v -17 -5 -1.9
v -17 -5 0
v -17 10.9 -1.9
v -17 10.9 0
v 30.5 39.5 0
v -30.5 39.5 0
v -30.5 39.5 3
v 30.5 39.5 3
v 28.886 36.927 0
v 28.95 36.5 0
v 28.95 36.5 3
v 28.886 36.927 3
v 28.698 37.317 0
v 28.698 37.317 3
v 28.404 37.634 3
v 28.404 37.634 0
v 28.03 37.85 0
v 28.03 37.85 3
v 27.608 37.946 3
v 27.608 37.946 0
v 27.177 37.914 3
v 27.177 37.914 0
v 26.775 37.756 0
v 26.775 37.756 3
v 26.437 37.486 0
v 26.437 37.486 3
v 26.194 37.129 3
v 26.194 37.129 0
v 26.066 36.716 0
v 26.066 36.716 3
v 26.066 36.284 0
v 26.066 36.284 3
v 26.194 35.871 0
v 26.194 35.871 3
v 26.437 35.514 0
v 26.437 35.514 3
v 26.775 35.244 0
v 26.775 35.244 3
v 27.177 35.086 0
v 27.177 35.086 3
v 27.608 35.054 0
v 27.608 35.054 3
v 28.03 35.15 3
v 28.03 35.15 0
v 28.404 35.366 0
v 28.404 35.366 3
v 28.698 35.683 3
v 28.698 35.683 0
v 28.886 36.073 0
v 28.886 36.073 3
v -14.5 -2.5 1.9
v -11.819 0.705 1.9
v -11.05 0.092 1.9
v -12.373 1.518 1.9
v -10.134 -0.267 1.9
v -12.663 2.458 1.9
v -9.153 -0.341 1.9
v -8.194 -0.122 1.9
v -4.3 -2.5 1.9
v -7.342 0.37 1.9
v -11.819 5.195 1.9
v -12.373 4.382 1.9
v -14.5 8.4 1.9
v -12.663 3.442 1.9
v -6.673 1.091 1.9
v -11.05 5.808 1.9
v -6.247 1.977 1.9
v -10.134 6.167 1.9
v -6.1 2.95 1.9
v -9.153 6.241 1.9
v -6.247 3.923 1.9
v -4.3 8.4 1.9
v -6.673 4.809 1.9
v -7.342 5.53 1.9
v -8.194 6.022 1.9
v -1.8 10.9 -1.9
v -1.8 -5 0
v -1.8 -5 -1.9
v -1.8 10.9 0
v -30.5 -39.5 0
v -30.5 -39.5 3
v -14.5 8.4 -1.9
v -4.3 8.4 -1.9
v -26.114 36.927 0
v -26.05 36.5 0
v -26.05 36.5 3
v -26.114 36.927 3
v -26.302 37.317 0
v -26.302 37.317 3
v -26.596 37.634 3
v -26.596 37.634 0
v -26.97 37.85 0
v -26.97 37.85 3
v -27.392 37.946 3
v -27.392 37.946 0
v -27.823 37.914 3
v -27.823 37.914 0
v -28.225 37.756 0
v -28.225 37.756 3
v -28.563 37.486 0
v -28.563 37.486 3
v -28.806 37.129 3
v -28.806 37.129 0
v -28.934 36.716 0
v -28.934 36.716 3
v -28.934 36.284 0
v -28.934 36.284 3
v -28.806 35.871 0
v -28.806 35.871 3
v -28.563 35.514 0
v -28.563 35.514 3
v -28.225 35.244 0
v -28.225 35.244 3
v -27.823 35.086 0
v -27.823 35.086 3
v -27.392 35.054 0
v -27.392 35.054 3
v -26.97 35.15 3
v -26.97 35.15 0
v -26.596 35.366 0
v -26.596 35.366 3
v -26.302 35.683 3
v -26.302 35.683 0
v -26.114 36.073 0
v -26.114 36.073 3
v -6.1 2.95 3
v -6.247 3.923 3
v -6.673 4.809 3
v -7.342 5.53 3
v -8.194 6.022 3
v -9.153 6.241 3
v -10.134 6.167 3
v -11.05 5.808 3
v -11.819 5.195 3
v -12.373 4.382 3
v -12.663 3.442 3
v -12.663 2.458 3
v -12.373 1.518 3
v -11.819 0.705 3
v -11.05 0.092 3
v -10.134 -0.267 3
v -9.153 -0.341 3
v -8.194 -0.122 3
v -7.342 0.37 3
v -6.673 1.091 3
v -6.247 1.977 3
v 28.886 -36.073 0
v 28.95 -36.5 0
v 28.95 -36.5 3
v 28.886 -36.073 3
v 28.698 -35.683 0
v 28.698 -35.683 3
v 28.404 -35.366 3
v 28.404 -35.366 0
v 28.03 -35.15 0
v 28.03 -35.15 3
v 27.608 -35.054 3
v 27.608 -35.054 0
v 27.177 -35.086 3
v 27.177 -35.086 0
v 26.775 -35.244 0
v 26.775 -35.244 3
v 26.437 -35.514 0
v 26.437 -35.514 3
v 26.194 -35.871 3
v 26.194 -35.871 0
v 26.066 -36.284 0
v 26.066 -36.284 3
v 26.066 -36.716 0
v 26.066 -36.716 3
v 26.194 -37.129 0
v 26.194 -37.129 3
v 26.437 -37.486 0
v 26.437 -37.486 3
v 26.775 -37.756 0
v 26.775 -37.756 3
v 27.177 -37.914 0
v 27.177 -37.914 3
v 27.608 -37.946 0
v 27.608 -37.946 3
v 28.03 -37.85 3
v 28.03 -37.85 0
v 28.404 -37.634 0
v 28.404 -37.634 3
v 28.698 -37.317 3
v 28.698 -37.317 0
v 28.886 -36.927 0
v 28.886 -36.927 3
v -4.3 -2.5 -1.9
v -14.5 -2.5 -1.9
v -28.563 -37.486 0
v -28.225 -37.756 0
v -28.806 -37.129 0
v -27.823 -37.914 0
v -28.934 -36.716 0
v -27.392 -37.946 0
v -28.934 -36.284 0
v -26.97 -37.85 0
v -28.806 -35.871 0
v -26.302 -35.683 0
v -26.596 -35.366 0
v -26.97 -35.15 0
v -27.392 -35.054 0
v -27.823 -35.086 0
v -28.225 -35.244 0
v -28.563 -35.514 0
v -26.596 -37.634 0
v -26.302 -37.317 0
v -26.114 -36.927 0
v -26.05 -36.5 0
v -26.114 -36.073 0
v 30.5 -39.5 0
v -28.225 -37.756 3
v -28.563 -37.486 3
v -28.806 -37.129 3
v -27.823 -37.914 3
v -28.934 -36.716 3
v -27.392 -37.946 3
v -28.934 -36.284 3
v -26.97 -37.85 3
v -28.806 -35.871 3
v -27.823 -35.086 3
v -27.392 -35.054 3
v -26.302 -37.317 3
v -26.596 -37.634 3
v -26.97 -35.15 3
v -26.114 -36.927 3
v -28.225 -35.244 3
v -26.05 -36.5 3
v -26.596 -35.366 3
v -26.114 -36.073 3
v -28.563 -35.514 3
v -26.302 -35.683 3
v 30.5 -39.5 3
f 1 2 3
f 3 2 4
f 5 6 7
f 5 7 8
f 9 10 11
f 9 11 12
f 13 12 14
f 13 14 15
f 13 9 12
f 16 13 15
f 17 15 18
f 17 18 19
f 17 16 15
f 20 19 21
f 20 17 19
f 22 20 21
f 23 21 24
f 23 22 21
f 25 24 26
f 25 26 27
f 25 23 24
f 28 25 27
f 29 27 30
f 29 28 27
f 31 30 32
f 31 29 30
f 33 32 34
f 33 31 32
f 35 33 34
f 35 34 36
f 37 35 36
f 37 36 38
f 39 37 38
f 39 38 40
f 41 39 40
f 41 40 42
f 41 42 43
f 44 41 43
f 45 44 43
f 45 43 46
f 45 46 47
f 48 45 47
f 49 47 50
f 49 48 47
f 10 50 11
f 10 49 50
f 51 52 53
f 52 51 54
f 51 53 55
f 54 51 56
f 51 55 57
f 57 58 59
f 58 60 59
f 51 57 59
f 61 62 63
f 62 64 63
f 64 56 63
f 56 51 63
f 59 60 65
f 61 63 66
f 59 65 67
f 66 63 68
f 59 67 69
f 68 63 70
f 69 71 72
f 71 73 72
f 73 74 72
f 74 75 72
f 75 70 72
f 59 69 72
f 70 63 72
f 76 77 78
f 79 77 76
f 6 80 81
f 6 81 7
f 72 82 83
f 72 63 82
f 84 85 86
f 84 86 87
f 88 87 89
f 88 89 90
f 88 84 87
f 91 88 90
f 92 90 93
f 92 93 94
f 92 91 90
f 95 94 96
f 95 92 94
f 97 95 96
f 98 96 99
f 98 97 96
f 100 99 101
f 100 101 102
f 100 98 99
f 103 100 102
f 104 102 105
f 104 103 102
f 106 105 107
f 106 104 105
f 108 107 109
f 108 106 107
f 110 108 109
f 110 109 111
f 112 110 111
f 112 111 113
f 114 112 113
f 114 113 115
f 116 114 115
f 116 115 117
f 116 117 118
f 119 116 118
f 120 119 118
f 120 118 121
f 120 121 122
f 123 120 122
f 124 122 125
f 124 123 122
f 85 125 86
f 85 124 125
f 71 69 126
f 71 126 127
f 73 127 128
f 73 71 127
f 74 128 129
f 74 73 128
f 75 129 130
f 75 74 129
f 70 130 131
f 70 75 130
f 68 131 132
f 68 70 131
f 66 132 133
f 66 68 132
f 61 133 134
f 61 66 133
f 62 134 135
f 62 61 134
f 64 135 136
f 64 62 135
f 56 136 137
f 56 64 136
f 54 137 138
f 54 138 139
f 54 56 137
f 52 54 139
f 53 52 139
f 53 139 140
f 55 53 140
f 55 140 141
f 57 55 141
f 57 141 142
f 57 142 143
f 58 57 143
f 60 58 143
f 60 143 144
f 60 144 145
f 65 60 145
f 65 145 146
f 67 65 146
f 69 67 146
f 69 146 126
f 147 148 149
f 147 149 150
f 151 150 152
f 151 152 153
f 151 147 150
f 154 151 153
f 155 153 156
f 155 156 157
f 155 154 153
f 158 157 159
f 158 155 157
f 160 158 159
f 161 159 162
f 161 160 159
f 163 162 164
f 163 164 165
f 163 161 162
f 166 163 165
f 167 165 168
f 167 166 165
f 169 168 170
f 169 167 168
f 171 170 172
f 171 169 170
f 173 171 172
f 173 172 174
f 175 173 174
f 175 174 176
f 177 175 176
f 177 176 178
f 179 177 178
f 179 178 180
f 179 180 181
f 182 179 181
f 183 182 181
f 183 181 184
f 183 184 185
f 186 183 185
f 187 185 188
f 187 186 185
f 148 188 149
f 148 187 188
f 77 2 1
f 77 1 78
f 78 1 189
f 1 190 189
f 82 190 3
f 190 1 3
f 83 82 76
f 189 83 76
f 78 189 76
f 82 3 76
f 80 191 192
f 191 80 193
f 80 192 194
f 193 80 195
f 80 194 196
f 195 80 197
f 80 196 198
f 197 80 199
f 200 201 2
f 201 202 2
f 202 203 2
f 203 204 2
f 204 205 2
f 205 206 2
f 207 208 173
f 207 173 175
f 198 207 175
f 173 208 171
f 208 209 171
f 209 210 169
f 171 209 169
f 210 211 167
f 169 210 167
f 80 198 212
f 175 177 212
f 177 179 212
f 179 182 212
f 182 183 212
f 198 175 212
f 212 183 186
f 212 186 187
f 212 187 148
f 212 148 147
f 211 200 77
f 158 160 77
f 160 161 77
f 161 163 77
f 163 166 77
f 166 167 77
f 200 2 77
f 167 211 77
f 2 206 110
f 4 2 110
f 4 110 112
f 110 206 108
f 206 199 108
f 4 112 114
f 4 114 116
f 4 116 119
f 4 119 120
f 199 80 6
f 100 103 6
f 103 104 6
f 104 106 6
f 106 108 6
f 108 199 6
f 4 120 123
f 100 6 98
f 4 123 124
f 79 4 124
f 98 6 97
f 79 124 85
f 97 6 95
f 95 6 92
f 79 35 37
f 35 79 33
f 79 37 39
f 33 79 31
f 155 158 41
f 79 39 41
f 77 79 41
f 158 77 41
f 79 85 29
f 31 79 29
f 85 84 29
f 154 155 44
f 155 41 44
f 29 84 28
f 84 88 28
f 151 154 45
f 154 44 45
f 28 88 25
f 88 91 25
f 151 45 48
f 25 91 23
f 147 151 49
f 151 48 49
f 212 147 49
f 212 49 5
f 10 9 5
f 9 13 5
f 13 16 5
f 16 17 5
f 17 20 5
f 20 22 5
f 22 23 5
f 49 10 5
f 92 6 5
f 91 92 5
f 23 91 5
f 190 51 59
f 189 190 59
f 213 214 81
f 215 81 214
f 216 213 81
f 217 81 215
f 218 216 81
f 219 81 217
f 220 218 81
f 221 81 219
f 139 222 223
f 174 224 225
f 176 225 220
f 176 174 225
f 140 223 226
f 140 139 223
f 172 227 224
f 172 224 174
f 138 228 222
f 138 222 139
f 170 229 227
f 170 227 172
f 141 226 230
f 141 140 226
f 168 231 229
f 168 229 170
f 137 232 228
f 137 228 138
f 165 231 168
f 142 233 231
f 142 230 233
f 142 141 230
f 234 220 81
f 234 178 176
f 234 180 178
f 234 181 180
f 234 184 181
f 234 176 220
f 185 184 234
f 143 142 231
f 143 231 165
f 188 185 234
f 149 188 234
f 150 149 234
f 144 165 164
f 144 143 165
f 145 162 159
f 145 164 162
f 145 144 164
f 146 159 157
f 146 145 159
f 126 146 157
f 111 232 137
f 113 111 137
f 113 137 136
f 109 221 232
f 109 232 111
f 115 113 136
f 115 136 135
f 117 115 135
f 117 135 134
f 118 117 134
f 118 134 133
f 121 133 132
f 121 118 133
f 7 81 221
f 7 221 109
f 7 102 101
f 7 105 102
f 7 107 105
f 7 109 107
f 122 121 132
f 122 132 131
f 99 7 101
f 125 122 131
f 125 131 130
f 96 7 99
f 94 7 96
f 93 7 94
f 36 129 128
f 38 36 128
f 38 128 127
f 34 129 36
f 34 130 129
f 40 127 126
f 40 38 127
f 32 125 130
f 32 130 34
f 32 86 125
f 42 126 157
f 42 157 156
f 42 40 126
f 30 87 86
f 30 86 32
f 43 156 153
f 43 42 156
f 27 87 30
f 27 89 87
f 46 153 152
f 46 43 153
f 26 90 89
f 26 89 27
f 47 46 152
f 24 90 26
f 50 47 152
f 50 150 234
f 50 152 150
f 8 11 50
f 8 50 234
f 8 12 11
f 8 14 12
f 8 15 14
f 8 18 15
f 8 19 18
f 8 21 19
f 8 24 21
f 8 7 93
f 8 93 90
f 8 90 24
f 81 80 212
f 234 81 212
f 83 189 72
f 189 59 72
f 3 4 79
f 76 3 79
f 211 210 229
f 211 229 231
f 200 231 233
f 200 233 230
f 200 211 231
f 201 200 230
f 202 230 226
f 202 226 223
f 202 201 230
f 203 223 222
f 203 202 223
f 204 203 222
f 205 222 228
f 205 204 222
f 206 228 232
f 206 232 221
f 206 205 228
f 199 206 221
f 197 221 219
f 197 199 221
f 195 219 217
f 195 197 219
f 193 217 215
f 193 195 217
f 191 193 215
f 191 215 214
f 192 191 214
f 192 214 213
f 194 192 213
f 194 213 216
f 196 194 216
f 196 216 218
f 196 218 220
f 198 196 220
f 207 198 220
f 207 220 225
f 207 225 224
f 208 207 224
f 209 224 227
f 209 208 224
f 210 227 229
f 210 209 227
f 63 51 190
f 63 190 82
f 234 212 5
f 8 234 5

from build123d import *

# Parameters (mm, degrees)
F0_W     = 61
F0_H     = 79
F0_R     = 1.45
F0_W_2   = 15.200002
F0_H_2   = 15.900002
F0_W_3   = 10.2
F0_H_3   = 10.9
F0_R_2   = 3.3
F1_DEPTH = 3
F2_DEPTH = 1.9
F3_DEPTH = 1.9


with BuildPart() as f1:
    # F0 (on Top) → F1 (new body)
    with BuildSketch(Plane.XY):
        Rectangle(F0_W, F0_H)
        with Locations((-27.5, -36.5)):
            Circle(F0_R, mode=Mode.SUBTRACT)
        with Locations((27.5, -36.5)):
            Circle(F0_R, mode=Mode.SUBTRACT)
        with Locations((-9.4, 2.95)):
            Rectangle(F0_W_2, F0_H_2, mode=Mode.SUBTRACT)
        with Locations((-27.5, 36.5)):
            Circle(F0_R, mode=Mode.SUBTRACT)
        with Locations((27.5, 36.5)):
            Circle(F0_R, mode=Mode.SUBTRACT)
        with Locations((-9.4, 2.95)):
            Rectangle(F0_W_2, F0_H_2)
        with Locations((-9.4, 2.95)):
            Rectangle(F0_W_3, F0_H_3, mode=Mode.SUBTRACT)
        with Locations((-9.4, 2.95)):
            Rectangle(F0_W_3, F0_H_3)
        with Locations((-9.4, 2.95)):
            Circle(F0_R_2, mode=Mode.SUBTRACT)
    extrude(amount=F1_DEPTH)

    # F0 (on Top) → F2 (cut)
    with BuildSketch(Plane.XY):
        with Locations((-9.4, 2.95)):
            Rectangle(F0_W_3, F0_H_3)
        with Locations((-9.4, 2.95)):
            Circle(F0_R_2, mode=Mode.SUBTRACT)
    extrude(amount=F2_DEPTH, mode=Mode.SUBTRACT)

    # F0 (on Top) → F3 (join)
    with BuildSketch(Plane.XY):
        with Locations((-9.4, 2.95)):
            Rectangle(F0_W_2, F0_H_2)
        with Locations((-9.4, 2.95)):
            Rectangle(F0_W_3, F0_H_3, mode=Mode.SUBTRACT)
    extrude(amount=-F3_DEPTH)


solid = f1.part
